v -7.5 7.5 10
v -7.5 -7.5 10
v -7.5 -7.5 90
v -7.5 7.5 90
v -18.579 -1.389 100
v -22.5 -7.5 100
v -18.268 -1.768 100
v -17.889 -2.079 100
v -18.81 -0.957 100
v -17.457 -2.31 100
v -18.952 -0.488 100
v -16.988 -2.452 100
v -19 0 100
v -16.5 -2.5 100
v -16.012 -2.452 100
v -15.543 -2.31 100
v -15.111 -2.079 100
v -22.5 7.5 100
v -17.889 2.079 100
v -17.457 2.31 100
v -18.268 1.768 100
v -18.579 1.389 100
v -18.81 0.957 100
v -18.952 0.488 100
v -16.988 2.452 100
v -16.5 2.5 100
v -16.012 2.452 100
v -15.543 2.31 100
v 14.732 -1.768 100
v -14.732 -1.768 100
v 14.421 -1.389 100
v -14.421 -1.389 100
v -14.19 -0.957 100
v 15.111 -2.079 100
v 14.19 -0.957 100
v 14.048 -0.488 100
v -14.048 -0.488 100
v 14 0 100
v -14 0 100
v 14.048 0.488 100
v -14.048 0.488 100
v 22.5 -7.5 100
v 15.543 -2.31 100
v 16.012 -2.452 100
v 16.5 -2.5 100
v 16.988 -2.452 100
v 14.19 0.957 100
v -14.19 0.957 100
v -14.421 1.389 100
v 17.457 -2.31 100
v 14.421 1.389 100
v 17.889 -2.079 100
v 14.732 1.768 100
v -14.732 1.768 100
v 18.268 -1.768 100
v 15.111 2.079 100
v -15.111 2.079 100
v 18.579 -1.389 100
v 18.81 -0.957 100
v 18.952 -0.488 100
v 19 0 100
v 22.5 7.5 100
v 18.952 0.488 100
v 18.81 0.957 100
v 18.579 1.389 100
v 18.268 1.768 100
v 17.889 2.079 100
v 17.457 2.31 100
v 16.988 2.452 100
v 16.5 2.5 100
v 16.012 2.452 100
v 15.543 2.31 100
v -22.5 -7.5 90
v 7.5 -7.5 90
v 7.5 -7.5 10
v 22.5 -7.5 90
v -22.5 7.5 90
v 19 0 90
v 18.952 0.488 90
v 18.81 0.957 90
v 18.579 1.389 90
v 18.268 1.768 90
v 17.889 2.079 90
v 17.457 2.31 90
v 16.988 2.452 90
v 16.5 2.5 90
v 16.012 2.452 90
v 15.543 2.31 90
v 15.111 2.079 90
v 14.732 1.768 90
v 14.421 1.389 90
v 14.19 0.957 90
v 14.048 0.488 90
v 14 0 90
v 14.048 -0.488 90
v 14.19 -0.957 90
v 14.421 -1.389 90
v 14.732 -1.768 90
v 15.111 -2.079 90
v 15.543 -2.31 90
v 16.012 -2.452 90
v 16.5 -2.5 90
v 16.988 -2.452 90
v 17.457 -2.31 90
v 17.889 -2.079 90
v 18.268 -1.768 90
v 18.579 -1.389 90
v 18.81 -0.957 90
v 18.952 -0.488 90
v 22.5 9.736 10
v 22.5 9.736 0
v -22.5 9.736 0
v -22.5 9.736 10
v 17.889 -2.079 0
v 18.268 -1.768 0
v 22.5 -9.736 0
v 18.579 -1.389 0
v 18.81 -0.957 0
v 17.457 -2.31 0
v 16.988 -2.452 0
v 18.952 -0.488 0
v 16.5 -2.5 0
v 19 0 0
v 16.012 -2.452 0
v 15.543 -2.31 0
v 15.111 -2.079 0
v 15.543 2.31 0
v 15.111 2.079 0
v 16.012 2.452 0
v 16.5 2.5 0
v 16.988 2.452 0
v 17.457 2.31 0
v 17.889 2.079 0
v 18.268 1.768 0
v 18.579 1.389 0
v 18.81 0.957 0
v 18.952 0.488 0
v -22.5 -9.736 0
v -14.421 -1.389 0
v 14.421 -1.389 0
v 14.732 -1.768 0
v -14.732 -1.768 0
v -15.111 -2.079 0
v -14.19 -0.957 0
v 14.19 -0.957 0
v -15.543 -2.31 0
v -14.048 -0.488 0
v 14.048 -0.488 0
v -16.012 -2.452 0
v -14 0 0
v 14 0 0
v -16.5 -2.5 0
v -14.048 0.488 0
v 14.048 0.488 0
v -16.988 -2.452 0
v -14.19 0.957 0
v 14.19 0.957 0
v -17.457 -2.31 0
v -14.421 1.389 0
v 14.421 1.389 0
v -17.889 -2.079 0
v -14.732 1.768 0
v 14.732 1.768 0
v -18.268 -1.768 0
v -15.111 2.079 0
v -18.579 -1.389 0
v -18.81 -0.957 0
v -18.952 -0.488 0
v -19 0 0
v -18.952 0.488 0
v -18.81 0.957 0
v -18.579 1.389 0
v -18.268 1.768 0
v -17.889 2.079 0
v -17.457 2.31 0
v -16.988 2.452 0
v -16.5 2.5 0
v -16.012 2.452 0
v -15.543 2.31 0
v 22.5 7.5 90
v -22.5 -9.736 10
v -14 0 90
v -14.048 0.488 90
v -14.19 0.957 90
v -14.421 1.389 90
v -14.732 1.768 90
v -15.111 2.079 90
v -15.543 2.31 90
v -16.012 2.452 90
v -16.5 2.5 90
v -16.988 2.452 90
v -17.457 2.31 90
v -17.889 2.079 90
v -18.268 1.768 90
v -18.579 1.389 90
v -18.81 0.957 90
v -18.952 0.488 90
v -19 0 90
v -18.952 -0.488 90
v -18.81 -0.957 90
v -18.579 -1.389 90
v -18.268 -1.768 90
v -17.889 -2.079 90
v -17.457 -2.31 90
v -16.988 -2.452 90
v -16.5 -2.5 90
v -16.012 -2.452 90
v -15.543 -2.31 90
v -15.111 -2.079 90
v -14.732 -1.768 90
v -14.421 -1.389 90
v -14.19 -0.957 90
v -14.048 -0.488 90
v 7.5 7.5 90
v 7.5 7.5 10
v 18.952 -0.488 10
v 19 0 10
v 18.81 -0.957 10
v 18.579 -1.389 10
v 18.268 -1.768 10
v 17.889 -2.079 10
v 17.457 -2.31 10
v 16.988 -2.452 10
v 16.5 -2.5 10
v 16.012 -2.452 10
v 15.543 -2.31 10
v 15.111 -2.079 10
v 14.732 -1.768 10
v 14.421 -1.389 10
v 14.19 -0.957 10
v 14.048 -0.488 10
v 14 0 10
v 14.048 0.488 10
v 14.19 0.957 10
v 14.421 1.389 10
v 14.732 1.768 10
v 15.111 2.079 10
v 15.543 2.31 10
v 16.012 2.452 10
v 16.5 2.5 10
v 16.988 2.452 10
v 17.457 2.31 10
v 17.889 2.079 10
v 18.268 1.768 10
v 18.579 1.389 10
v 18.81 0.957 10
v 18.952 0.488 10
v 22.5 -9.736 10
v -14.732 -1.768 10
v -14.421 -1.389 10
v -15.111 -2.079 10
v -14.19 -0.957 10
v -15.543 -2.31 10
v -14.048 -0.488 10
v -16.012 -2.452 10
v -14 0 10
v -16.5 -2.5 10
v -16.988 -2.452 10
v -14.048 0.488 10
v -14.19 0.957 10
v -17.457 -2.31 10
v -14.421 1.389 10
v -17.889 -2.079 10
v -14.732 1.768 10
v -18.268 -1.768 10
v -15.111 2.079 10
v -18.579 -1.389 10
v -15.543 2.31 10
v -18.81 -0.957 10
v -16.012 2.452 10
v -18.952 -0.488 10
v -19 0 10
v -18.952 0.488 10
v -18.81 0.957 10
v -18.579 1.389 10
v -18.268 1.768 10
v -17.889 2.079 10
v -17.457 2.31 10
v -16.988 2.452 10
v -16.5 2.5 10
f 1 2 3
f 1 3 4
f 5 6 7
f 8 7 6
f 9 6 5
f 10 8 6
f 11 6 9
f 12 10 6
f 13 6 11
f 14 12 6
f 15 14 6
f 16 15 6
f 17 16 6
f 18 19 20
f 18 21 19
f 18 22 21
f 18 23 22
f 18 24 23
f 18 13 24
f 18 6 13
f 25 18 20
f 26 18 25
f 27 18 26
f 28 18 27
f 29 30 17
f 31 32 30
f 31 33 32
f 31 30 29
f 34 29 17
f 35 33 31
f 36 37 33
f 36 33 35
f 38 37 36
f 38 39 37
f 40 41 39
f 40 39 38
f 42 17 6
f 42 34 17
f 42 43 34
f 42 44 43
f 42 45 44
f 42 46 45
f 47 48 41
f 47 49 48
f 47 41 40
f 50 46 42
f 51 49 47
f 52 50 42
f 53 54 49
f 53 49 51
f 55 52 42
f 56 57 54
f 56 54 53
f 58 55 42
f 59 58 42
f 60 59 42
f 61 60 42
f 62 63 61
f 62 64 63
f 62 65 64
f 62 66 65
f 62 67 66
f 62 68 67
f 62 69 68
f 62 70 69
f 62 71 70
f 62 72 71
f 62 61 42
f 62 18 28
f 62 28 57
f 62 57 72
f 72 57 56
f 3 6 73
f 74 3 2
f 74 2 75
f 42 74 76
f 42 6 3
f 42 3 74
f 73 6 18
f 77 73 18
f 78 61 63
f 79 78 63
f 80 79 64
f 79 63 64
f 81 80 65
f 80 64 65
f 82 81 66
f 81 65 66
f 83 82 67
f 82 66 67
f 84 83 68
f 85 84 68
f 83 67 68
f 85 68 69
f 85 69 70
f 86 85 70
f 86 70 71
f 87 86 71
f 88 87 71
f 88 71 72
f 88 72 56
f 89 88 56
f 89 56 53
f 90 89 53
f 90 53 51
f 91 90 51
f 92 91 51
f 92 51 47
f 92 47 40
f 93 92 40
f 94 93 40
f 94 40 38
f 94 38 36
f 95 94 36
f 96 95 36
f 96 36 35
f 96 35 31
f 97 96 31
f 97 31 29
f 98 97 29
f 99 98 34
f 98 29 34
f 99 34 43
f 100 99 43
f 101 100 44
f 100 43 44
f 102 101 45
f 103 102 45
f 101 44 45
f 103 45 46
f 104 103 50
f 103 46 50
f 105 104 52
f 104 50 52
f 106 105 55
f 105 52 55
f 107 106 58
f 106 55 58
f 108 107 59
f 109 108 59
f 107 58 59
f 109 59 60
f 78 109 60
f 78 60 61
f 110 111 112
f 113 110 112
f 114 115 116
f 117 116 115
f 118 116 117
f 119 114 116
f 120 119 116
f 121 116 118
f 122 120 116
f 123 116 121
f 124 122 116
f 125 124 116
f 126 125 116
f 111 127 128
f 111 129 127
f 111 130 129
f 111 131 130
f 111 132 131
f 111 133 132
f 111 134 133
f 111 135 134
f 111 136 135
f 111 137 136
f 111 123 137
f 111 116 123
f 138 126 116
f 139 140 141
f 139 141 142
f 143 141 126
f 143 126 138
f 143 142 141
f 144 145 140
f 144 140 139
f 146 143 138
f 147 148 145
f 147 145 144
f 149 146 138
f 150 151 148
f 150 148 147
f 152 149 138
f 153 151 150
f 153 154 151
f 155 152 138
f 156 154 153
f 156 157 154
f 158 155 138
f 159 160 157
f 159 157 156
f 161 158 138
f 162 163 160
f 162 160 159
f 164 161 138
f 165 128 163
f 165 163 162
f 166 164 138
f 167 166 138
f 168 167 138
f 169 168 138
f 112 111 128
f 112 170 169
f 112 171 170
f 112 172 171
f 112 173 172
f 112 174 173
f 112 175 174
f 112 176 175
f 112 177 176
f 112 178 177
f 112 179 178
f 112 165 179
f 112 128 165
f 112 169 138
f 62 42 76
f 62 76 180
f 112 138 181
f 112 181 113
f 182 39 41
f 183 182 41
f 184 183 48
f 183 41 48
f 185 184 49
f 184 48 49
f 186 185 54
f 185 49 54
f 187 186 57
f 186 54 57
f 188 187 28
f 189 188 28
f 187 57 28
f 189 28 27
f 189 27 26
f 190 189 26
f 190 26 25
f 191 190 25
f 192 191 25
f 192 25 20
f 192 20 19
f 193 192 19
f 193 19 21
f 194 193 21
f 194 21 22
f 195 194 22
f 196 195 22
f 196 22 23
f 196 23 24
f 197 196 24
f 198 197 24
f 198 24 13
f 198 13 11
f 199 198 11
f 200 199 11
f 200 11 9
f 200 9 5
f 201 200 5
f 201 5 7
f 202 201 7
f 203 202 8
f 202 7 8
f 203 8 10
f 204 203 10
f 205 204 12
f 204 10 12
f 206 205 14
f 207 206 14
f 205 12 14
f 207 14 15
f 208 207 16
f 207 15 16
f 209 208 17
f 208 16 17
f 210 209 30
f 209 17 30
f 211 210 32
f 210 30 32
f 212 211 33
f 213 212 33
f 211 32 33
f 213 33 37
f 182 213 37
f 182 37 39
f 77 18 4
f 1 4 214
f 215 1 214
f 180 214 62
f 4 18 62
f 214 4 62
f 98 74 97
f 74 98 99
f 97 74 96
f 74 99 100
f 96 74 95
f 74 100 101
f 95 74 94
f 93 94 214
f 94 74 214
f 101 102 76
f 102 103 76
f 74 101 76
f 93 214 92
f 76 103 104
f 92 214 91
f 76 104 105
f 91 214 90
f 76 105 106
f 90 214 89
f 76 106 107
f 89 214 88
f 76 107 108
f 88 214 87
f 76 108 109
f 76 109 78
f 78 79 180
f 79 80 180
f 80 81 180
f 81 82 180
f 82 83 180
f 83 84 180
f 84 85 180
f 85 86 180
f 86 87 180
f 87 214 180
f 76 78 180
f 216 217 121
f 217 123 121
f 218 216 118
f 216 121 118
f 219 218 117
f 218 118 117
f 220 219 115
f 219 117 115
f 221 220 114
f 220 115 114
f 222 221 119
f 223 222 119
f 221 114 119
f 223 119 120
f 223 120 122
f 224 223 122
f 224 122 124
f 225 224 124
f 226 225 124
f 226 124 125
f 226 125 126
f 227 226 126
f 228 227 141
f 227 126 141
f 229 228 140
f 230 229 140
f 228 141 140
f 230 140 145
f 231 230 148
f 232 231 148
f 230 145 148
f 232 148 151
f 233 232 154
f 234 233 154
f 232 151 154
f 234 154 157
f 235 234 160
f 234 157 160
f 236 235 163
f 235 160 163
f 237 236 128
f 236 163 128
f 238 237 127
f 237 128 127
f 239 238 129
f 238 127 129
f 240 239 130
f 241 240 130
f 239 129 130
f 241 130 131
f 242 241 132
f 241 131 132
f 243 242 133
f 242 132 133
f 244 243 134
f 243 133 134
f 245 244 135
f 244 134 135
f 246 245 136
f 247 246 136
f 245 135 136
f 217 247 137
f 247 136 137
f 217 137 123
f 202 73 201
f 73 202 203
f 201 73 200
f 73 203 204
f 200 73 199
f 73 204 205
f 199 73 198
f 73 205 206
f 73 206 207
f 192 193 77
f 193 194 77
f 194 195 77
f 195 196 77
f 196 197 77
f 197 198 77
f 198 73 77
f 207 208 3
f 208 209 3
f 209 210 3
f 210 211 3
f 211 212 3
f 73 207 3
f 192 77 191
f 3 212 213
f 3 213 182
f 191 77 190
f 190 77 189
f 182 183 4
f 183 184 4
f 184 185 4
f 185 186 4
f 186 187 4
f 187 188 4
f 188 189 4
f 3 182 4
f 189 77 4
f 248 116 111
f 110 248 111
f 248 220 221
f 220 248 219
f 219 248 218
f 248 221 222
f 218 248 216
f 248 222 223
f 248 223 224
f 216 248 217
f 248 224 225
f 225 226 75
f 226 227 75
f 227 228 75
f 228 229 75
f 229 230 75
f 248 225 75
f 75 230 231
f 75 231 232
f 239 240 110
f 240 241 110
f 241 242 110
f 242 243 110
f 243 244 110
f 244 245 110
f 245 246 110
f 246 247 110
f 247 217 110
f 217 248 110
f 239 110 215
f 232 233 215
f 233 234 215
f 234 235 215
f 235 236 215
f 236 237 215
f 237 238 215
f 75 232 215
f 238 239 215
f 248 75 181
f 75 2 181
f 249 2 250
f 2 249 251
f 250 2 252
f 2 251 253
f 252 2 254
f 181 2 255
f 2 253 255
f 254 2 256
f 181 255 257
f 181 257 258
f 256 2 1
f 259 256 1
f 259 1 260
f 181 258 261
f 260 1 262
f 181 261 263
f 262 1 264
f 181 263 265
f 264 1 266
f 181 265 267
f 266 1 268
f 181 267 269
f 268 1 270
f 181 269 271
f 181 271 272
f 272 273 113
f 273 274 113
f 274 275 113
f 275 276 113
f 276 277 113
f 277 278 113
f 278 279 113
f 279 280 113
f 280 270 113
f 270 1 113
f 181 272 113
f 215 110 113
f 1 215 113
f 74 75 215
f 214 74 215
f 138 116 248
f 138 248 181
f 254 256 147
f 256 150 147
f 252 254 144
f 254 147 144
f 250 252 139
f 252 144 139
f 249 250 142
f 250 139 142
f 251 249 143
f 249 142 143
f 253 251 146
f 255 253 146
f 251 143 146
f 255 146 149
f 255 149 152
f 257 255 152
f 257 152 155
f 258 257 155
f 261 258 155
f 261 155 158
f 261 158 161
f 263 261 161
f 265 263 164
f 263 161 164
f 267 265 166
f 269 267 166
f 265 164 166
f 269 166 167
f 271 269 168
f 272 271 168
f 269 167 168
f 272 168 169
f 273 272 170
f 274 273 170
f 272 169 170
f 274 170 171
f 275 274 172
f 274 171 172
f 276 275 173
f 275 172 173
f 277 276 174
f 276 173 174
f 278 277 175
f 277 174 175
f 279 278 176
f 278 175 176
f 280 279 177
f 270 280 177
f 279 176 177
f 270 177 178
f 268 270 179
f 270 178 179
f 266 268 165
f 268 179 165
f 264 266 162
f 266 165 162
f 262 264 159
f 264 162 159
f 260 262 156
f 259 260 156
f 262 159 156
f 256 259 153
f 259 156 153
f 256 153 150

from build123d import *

# Parameters (mm, degrees)
SKETCH_1_W          = 15
SKETCH_1_H          = 15
EXTRUDE_1_DEPTH     = 100
SKETCH_2_W          = 45
SKETCH_2_H          = 15
EXTRUDE_2_DEPTH     = 10
SKETCH_3_R          = 2.5
CUT_EXTRUDE_1_DEPTH = 20
SKETCH_5_W          = 45
SKETCH_5_H          = 19.472765692
EXTRUDE_3_DEPTH     = 10
SKETCH_6_R          = 2.5
CUT_EXTRUDE_2_DEPTH = 103.961386699


with BuildPart() as part:
    # 草图1 → 凸台-拉伸1 (new body)
    with BuildSketch(Plane.XY):
        Rectangle(SKETCH_1_W, SKETCH_1_H)
    extrude(amount=EXTRUDE_1_DEPTH)

    # 草图2 → 凸台-拉伸2 (add)
    with BuildSketch(Plane.XY.offset(100)):
        Rectangle(SKETCH_2_W, SKETCH_2_H)
    extrude(amount=-EXTRUDE_2_DEPTH)

    # 草图3 → 切除-拉伸1 (cut)
    with BuildSketch(Plane.XY.offset(100)):
        with Locations((-16.5, 0)):
            Circle(SKETCH_3_R)
        with Locations((16.5, 0)):
            Circle(SKETCH_3_R)
    extrude(amount=-CUT_EXTRUDE_1_DEPTH, mode=Mode.SUBTRACT)

    # 草图5 → 凸台-拉伸3 (add)
    with BuildSketch(Plane(origin=(0, 0, 0), x_dir=(-1, 0, 0), z_dir=(0, 0, -1))):
        Rectangle(SKETCH_5_W, SKETCH_5_H)
    extrude(amount=-EXTRUDE_3_DEPTH)

    # 草图6 → 切除-拉伸2 (cut, through all)
    with BuildSketch(Plane(origin=(0, 0, 0), x_dir=(-1, 0, 0), z_dir=(0, 0, -1))):
        with Locations(Location((-16.5, 0, 0), (0, 0, 180))):
            Circle(SKETCH_6_R)
        with Locations(Location((16.5, 0, 0), (0, 0, 180))):
            Circle(SKETCH_6_R)
    extrude(amount=-CUT_EXTRUDE_2_DEPTH, mode=Mode.SUBTRACT)


solid = part.part
